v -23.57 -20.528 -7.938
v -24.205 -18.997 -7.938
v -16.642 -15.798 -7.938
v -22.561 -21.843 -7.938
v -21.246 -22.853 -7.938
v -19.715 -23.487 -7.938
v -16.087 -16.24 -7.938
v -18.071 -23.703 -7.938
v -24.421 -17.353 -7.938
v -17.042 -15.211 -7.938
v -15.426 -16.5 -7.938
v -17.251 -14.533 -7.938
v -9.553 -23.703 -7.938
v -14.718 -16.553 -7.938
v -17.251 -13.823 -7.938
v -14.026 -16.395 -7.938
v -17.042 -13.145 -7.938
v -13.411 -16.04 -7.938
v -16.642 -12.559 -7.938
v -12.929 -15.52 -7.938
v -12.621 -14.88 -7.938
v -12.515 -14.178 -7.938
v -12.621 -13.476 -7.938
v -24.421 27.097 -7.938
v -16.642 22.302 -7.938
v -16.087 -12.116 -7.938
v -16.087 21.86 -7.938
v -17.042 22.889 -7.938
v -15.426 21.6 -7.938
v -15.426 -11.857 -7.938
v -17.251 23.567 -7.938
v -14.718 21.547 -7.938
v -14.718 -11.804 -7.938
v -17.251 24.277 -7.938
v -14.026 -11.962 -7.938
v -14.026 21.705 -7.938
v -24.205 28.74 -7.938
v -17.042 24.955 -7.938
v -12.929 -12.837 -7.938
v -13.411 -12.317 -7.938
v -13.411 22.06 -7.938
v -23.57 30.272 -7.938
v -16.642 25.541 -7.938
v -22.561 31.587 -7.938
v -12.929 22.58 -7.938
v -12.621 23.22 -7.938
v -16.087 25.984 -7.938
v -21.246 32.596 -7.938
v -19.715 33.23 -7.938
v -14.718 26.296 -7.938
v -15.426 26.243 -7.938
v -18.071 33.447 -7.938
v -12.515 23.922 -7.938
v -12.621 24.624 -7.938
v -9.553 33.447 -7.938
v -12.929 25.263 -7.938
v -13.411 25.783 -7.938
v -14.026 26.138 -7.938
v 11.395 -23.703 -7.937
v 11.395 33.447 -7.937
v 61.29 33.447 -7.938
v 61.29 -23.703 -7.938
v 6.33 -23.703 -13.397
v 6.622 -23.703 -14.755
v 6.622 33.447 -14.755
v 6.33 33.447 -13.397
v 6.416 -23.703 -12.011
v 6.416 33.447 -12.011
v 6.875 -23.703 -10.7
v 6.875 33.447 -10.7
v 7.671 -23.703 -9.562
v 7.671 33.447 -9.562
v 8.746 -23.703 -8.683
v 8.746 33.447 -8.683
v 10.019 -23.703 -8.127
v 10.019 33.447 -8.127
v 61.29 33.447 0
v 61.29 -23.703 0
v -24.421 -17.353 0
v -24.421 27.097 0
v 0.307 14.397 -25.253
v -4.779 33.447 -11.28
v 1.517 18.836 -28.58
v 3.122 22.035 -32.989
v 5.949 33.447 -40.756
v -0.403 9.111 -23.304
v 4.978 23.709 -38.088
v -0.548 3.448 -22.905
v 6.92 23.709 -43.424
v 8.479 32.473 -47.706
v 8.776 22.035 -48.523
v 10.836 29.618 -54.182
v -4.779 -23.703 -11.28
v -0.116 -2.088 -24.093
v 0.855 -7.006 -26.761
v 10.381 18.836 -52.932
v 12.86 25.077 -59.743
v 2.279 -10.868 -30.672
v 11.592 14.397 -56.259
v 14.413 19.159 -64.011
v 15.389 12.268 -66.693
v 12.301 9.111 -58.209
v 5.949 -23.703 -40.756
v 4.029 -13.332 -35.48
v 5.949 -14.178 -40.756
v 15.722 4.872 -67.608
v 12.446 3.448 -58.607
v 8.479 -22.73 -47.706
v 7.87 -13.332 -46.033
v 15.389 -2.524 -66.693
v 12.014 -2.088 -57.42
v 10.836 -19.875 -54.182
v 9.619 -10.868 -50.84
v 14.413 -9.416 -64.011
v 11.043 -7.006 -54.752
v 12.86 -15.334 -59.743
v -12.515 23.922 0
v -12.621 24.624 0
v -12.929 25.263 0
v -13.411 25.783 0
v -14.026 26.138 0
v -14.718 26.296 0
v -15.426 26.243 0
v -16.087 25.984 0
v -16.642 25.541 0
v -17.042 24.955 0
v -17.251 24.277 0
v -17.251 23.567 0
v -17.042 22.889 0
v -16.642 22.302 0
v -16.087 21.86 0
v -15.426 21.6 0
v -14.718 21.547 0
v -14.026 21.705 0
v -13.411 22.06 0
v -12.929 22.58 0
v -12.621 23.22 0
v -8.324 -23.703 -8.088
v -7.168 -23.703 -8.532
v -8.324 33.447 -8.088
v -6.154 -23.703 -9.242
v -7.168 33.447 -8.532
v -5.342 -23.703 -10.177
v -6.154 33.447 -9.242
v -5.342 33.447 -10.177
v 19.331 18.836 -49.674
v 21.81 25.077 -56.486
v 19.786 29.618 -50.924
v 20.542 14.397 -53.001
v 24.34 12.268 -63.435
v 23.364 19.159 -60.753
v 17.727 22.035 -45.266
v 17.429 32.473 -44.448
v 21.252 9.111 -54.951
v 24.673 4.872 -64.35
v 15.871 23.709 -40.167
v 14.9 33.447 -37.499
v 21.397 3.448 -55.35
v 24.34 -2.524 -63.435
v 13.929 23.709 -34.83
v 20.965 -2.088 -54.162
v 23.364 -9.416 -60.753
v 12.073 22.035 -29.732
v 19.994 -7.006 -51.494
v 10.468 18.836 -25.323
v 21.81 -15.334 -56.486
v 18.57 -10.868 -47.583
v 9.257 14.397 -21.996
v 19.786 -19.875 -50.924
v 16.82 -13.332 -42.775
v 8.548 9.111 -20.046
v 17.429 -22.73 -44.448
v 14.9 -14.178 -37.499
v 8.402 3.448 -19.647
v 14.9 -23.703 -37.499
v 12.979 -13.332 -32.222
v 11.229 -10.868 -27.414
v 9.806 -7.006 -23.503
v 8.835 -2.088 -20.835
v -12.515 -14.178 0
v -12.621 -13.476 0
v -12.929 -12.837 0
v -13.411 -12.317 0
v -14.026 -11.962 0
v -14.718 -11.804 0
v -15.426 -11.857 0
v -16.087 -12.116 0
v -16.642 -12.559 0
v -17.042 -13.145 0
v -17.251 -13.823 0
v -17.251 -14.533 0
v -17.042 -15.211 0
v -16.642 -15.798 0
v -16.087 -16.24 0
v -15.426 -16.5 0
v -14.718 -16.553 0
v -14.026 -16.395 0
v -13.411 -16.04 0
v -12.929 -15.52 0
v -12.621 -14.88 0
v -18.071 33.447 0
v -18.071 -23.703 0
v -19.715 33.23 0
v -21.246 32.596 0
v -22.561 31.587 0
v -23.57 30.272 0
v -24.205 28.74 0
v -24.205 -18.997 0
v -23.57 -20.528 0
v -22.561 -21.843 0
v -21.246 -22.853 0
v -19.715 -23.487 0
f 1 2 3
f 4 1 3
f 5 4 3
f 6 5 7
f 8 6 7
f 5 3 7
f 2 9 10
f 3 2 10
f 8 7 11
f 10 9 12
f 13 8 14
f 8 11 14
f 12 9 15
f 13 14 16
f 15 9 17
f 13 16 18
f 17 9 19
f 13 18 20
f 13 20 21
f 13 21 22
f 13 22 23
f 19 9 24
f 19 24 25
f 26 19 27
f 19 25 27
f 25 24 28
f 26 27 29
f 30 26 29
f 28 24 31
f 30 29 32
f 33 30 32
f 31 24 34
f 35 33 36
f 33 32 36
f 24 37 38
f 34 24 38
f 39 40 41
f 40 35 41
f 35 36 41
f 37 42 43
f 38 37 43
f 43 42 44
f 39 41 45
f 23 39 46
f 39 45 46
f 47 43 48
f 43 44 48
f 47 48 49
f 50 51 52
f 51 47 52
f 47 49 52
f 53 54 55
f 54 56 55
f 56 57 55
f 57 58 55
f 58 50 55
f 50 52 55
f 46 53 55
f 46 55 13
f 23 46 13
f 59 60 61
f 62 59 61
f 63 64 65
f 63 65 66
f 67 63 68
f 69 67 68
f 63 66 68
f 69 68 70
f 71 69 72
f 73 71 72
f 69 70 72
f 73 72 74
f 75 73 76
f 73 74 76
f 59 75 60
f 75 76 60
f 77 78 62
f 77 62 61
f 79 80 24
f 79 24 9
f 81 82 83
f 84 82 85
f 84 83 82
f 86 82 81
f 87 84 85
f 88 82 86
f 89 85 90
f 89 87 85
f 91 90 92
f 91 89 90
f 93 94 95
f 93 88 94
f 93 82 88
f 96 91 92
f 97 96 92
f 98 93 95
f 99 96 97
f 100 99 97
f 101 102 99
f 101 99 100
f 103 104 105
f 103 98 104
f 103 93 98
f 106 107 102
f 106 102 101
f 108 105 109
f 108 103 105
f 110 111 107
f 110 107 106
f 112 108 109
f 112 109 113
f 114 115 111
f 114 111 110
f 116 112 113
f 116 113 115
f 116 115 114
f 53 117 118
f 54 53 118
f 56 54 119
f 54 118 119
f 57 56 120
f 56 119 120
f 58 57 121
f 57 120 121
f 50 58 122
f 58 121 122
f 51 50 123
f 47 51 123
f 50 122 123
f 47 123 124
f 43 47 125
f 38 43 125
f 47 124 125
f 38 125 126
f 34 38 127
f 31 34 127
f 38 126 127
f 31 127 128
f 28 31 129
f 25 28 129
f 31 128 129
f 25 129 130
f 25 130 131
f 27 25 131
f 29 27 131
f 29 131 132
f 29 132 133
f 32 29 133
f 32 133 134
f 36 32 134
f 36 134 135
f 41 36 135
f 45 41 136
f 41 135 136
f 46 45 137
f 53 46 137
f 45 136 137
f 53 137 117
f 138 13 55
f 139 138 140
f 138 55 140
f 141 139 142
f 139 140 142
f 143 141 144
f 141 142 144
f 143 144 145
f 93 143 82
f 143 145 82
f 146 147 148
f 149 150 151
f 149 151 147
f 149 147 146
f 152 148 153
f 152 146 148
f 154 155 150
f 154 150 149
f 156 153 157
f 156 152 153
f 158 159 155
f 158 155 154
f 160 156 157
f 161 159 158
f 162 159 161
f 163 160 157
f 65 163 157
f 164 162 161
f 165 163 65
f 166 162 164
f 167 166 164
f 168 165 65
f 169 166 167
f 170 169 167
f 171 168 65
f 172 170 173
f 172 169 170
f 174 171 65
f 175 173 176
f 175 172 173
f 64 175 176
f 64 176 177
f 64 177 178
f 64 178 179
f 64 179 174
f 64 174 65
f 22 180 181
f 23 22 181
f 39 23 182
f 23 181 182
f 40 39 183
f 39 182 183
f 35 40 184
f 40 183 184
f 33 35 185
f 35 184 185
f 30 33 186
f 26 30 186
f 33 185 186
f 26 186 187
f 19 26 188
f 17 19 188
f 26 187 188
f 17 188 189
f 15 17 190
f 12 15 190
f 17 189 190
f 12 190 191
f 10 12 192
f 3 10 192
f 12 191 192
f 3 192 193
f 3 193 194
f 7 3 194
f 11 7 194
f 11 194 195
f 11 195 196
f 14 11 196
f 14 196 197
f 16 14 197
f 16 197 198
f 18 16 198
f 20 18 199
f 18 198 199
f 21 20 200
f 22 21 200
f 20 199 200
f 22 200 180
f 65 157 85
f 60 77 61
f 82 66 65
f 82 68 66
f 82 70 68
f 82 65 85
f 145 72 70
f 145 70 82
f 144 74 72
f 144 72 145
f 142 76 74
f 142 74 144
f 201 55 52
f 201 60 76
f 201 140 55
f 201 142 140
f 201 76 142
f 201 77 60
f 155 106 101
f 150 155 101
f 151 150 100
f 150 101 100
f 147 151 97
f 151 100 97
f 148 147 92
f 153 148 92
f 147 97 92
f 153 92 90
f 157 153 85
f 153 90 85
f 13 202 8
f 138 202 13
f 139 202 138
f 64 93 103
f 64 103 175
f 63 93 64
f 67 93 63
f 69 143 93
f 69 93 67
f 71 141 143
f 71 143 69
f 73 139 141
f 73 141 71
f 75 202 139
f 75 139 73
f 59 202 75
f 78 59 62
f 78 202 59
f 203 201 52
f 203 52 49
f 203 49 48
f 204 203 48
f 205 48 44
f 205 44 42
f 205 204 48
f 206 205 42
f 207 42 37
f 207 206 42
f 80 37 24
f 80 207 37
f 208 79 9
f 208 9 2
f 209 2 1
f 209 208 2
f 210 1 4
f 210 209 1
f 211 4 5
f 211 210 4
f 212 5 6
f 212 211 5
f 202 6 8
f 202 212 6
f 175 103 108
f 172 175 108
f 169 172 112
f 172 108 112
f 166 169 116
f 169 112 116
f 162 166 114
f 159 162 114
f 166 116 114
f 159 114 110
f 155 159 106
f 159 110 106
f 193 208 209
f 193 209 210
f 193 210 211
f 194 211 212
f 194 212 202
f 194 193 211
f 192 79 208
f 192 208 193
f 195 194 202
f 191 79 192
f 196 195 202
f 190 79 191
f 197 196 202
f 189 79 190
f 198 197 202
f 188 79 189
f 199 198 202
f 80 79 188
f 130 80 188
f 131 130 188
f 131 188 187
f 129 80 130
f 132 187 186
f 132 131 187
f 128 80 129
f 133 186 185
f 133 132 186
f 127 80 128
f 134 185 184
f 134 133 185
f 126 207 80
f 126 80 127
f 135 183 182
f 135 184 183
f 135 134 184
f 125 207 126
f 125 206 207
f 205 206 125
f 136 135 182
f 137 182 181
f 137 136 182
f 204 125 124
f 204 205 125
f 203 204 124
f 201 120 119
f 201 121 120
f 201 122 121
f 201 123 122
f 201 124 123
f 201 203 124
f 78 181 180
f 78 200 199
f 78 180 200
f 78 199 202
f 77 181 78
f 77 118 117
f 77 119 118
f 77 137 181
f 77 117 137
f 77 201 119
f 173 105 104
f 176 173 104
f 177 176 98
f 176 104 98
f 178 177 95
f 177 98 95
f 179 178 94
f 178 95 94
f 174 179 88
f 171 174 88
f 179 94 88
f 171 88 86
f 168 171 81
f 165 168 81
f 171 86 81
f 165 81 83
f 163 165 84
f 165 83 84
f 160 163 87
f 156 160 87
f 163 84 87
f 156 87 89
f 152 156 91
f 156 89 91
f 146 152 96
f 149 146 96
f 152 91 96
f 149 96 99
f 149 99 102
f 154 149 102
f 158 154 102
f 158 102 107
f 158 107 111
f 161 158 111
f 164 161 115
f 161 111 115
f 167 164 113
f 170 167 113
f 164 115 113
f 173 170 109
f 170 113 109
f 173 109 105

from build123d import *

# Parameters (mm, degrees)
F0_R     = 2.38125
F1_DEPTH = 7.9375
F3_DEPTH = 57.15
F4_R     = 19.05
F5_DEPTH = 9.525
F6_R     = 5.08


with BuildPart() as f1:
    # F0 (on Top) → F1 (new body)
    with BuildSketch(Plane.XY):
        with BuildLine():
            ThreePointArc((-18.0711051613, 33.4467460997), (-22.5612332218, 31.5868741602), (-24.4211051613, 27.0967460997))
            Line((-24.4211051613, 27.0967460997), (-24.4211051613, -17.3532539003))
            ThreePointArc((-24.4211051613, -17.3532539003), (-22.5612332218, -21.8433819608), (-18.0711051613, -23.7032539003))
            Line((-18.0711051613, -23.7032539003), (61.290320009, -23.7032539003))
            Line((61.290320009, -23.7032539003), (61.290320009, 33.4467460997))
            Line((61.290320009, 33.4467460997), (-18.0711051613, 33.4467460997))
        make_face()
        with Locations((-14.8961051613, -14.1782539003)):
            Circle(F0_R, mode=Mode.SUBTRACT)
        with Locations((-14.8961051613, 23.9217460997)):
            Circle(F0_R, mode=Mode.SUBTRACT)
    extrude(amount=-F1_DEPTH)

    # F2 (on face) → F3 (join)
    with BuildSketch(Plane.XZ.offset(23.7032539003)):
        Polygon((4.140320009, -7.9375), (-5.9959732738, -7.9375), (15.7223058273, -67.6079814199), (24.6728780403, -64.3502395547), align=None)
    extrude(amount=-F3_DEPTH)

    # F4 (on face) → F5 (cut, through all)
    with BuildSketch(Plane(origin=(-7.8456409666, 0, -2.8555797806), x_dir=(0, -1, 0), z_dir=(-0.9396926208, 0, -0.3420201433))):
        with Locations((-4.8717460997, -40.333066539)):
            Circle(F4_R)
        with BuildLine():
            ThreePointArc((-4.8717460546, -68.908066539), (-25.0773223561, -60.5386428273), (-33.4467460997, -40.333066539))
            Line((-33.4467460997, -40.333066539), (-33.4467460997, -68.908066539))
            Line((-33.4467460997, -68.908066539), (-4.8717460546, -68.908066539))
        make_face()
        with BuildLine():
            ThreePointArc((23.7032539003, -40.333066539), (15.3338301887, -60.5386427955), (-4.8717460546, -68.908066539))
            Line((-4.8717460546, -68.908066539), (23.7032539003, -68.908066539))
            Line((23.7032539003, -68.908066539), (23.7032539003, -40.333066539))
        make_face()
    extrude(amount=-F5_DEPTH, mode=Mode.SUBTRACT)

    # F6
    f6_edges = [f1.edges().sort_by_distance(p)[0] for p in [
        (-5.995973, 4.871746, -7.9375),
        (4.14032, 4.871746, -7.9375),
    ]]
    fillet(f6_edges, radius=F6_R)


solid = f1.part
